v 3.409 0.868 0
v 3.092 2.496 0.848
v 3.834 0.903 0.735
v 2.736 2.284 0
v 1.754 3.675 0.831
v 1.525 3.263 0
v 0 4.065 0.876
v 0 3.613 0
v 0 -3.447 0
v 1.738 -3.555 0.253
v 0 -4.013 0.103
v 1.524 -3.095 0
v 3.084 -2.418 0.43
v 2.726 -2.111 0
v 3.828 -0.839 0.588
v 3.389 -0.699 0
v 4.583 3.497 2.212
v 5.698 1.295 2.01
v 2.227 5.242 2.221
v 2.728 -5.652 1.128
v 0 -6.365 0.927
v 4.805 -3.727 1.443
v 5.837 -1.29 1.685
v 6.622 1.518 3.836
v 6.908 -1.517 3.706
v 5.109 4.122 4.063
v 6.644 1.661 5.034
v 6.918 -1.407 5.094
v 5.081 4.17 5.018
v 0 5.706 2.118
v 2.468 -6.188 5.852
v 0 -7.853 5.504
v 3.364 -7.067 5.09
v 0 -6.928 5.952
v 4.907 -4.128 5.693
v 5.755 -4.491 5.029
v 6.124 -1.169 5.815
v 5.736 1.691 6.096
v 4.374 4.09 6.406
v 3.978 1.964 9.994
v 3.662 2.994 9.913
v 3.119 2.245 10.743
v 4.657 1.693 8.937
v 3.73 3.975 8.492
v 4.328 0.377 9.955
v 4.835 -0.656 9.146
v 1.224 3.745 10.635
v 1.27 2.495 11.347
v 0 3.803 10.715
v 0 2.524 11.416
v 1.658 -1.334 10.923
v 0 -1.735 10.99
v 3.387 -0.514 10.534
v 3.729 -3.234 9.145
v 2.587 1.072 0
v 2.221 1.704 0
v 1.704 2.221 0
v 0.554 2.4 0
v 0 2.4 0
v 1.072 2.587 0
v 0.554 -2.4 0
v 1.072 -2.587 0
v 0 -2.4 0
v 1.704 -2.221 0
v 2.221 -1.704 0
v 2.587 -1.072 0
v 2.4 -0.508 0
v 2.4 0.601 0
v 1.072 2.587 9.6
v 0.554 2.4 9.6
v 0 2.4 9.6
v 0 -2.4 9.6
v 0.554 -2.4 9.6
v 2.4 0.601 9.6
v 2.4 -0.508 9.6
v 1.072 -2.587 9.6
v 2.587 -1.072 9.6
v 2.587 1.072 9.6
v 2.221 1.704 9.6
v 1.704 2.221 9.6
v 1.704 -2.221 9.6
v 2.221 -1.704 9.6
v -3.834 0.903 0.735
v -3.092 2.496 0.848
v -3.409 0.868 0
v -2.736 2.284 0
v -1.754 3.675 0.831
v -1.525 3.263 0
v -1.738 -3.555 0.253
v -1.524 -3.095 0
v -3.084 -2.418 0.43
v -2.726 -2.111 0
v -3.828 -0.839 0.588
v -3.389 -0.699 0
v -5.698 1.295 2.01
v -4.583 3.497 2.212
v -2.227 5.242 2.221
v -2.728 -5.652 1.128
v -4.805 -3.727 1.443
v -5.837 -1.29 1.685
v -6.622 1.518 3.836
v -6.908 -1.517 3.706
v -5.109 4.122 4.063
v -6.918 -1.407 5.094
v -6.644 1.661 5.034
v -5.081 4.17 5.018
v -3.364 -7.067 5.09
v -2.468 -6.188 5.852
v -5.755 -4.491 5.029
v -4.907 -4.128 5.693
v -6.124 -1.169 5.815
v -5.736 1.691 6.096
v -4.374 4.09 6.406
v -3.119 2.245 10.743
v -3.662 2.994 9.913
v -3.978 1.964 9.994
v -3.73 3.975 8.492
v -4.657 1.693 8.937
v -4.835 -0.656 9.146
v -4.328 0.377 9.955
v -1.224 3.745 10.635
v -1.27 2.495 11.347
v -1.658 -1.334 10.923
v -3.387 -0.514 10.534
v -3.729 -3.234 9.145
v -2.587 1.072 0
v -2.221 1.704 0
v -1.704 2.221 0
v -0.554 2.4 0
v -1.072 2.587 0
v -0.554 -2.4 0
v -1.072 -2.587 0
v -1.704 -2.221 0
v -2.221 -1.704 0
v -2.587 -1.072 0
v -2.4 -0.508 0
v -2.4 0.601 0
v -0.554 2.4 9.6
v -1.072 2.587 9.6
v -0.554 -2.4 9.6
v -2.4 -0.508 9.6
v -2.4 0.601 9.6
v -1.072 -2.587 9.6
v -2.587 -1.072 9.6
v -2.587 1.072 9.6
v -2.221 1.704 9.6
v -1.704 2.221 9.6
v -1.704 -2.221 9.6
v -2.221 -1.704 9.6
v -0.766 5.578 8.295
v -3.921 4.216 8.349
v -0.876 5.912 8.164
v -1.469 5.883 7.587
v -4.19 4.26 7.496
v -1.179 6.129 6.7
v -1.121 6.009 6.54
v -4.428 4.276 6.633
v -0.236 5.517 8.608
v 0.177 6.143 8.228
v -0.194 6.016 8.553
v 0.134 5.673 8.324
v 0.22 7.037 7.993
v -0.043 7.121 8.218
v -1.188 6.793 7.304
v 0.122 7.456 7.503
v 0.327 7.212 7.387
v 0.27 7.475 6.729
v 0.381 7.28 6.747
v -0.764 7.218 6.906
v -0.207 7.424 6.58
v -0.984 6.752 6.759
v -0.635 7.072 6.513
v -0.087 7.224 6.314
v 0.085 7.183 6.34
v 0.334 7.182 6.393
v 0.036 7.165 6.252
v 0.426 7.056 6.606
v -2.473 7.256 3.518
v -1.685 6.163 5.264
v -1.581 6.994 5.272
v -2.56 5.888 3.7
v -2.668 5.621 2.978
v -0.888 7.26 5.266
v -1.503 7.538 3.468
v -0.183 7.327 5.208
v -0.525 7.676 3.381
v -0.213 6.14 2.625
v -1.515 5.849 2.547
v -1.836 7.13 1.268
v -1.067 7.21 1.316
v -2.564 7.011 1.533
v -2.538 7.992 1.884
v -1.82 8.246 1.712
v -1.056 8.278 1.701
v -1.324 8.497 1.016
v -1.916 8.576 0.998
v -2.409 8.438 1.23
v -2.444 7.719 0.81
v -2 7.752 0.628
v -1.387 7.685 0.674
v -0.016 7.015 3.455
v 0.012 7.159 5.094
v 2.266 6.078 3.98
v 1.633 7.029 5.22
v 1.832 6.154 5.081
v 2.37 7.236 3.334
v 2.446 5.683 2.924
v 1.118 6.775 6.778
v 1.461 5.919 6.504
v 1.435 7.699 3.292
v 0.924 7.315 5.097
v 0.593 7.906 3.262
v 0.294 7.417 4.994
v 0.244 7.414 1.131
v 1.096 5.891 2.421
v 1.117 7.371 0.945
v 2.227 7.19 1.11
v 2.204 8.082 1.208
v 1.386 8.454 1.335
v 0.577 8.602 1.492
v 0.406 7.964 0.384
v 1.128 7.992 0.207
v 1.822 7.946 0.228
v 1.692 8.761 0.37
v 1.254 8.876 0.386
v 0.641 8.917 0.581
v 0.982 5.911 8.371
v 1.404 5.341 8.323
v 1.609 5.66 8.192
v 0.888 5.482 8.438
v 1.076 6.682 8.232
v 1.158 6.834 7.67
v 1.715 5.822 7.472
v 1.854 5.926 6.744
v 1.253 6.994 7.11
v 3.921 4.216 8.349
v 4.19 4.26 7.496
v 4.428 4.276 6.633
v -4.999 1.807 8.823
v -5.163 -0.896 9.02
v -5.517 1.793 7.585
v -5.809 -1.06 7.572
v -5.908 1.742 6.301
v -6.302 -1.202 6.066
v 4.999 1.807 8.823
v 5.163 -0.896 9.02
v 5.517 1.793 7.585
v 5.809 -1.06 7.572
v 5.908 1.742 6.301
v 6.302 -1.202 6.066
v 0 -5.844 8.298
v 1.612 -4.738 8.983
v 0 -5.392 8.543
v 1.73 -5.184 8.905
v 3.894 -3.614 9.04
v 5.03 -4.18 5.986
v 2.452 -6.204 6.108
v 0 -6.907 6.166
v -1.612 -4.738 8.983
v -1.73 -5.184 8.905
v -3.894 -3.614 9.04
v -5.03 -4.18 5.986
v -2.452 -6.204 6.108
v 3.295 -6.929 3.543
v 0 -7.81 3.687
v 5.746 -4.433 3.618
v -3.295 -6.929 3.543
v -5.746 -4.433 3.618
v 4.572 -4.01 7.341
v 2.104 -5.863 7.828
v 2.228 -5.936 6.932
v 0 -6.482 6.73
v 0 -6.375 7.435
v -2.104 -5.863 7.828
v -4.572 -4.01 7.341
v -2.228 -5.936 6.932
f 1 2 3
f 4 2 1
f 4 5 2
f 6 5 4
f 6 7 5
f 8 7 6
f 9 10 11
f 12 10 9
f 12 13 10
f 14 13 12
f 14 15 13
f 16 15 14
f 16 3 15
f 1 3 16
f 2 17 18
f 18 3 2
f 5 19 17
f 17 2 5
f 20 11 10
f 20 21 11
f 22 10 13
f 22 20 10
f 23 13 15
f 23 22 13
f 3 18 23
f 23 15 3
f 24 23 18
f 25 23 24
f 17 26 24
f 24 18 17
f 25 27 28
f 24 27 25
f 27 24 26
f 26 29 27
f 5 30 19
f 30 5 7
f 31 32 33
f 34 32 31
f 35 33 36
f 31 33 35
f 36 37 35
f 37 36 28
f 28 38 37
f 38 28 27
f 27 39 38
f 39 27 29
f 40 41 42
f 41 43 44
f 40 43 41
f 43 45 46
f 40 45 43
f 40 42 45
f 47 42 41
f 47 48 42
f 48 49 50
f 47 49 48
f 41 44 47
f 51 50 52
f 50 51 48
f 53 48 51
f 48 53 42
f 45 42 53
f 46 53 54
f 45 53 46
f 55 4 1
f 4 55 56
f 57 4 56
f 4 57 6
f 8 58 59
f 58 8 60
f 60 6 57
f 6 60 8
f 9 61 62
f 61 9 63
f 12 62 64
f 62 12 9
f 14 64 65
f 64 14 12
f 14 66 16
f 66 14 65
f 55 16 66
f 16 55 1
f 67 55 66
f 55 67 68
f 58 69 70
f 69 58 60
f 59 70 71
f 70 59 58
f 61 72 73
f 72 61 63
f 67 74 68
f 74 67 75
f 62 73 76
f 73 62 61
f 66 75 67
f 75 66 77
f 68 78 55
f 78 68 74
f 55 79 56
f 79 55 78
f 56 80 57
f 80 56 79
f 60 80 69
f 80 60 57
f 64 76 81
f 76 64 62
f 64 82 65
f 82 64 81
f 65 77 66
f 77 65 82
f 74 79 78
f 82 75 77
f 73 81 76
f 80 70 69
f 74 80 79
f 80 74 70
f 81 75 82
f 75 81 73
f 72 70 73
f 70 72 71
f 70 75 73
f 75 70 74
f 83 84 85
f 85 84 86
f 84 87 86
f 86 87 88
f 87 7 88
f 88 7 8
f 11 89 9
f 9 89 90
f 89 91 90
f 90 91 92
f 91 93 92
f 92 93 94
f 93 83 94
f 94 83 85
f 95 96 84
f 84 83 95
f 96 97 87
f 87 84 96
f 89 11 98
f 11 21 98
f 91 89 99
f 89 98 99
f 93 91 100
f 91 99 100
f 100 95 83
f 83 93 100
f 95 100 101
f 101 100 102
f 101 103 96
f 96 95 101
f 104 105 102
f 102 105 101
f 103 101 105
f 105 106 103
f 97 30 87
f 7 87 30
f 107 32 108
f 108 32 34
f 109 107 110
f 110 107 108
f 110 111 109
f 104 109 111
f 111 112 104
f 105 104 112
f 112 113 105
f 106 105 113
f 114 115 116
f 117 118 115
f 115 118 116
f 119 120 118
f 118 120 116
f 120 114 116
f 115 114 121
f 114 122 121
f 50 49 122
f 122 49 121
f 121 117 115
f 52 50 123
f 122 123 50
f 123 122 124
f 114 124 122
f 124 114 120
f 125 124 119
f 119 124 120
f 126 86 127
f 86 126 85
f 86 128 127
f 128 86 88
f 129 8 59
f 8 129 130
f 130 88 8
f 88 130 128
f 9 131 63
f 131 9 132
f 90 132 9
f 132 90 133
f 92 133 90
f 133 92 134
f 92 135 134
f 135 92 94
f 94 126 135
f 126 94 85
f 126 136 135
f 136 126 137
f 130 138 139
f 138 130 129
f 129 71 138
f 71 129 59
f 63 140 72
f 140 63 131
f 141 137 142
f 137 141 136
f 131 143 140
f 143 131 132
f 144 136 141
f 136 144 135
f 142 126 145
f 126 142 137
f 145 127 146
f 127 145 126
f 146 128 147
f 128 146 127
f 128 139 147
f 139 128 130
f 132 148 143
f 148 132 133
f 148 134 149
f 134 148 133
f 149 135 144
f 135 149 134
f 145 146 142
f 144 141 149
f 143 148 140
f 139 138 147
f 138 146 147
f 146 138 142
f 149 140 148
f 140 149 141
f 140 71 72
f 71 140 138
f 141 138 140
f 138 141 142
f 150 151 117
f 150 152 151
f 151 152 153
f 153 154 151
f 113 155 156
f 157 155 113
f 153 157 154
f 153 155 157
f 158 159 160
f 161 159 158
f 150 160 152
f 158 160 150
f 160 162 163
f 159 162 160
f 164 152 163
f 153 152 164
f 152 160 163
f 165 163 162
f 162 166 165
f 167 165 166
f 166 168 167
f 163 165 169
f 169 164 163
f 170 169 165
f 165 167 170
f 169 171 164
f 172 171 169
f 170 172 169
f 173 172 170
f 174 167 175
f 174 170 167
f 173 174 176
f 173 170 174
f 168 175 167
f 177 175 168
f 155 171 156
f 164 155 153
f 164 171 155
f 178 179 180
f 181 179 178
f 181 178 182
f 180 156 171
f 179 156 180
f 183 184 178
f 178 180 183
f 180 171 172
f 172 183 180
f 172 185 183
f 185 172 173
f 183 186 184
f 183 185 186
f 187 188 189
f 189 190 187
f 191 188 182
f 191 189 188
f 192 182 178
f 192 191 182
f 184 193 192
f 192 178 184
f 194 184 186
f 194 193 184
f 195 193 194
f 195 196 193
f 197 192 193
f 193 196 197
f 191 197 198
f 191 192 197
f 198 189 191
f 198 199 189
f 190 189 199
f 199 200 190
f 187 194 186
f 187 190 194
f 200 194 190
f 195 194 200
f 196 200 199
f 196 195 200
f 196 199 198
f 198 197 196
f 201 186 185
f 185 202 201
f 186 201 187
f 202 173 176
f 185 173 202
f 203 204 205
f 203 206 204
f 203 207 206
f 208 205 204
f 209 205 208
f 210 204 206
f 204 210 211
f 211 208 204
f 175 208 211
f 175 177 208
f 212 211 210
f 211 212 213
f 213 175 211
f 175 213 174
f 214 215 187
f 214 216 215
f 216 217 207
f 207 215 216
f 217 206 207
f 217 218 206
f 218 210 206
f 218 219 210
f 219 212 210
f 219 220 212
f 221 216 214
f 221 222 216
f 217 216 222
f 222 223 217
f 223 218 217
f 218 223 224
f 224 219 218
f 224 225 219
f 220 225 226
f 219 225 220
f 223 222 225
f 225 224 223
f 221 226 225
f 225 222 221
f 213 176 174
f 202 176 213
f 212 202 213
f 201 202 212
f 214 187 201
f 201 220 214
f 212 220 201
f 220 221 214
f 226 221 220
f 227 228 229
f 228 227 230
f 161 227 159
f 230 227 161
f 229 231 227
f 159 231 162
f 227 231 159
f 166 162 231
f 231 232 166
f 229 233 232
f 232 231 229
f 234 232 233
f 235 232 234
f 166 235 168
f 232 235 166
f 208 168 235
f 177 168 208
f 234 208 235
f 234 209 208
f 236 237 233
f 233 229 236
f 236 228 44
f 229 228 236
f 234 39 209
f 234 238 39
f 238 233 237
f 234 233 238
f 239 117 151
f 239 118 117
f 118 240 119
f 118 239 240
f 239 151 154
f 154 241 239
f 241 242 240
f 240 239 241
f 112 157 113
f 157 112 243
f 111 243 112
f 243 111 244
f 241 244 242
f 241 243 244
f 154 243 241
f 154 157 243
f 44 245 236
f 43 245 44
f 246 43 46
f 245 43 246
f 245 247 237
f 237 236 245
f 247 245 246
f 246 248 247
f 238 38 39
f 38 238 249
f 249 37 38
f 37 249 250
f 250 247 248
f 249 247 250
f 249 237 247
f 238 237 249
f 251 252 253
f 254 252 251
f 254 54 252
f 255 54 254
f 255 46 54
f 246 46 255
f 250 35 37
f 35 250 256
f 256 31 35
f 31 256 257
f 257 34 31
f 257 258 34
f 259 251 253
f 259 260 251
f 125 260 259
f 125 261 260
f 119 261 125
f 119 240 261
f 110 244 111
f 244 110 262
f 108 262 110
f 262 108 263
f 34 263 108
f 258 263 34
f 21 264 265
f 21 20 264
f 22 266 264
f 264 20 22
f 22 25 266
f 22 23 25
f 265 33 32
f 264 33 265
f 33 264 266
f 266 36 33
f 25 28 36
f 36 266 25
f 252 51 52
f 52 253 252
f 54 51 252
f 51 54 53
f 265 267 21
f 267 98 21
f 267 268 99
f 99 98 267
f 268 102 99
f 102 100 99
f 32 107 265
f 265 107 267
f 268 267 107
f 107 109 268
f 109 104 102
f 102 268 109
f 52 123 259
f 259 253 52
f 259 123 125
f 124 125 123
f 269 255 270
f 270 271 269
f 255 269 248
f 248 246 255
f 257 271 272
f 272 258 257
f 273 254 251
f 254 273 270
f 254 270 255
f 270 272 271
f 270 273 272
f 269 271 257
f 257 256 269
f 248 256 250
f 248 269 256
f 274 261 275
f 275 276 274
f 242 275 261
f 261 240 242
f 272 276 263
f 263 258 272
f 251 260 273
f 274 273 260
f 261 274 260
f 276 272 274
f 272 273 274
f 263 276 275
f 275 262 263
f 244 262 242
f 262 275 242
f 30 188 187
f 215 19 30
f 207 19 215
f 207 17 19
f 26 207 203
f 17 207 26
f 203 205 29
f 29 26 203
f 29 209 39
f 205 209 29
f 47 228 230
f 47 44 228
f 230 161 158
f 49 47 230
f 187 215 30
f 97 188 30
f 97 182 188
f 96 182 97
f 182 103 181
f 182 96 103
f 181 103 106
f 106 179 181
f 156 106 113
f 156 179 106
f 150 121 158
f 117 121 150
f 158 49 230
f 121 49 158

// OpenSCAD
use <../lib.scad>
use <s/12607s01.scad>
use <s/12607s02.scad>
use <s/12607s03.scad>
use <s/12607s04.scad>
use <s/12607s05.scad>
function ldraw_lib__12607() = [
// 0 Minifig Head Ninja Turtle
// 0 Name: 12607.dat
// 0 Author: Chris Böhnke [KnightOfTarenta]
// 0 !LDRAW_ORG Part UPDATE 2025-02
// 0 !LICENSE Licensed under CC BY 4.0 : see CAreadme.txt
// 
// 0 BFC CERTIFY CCW
  [0,"BFC","CERTIFY"],
  [0,"BFC","CCW"],
// 
// 0 !HISTORY 2013-08-14 {LEGO Digital Designer} Original part shape
// 0 !HISTORY 2024-04-14 [KnightOfTarenta] File preparation for LDraw Parts Tracker
// 0 !HISTORY 2025-02-27 [OrionP] Official Update 2025-02
// 
// 1 16 0 0 0 1 0 0 0 1 0 0 0 1 s\12607s01.dat
  [1,16,0,0,0,1,0,0,0,1,0,0,0,1, ldraw_lib__s__12607s01()],
// 1 16 0 0 0 -1 0 0 0 1 0 0 0 1 s\12607s01.dat
  [1,16,0,0,0,-1,0,0,0,1,0,0,0,1, ldraw_lib__s__12607s01()],
// 1 16 0 0 0 1 0 0 0 1 0 0 0 1 s\12607s02.dat
  [1,16,0,0,0,1,0,0,0,1,0,0,0,1, ldraw_lib__s__12607s02()],
// 1 16 0 0 0 1 0 0 0 1 0 0 0 1 s\12607s03.dat
  [1,16,0,0,0,1,0,0,0,1,0,0,0,1, ldraw_lib__s__12607s03()],
// 1 16 0 0 0 -1 0 0 0 1 0 0 0 1 s\12607s03.dat
  [1,16,0,0,0,-1,0,0,0,1,0,0,0,1, ldraw_lib__s__12607s03()],
// 1 16 0 0 0 1 0 0 0 1 0 0 0 1 s\12607s04.dat
  [1,16,0,0,0,1,0,0,0,1,0,0,0,1, ldraw_lib__s__12607s04()],
// 1 16 0 0 0 -1 0 0 0 1 0 0 0 1 s\12607s04.dat
  [1,16,0,0,0,-1,0,0,0,1,0,0,0,1, ldraw_lib__s__12607s04()],
// 1 16 0 0 0 1 0 0 0 1 0 0 0 1 s\12607s05.dat
  [1,16,0,0,0,1,0,0,0,1,0,0,0,1, ldraw_lib__s__12607s05()],
];
module ldraw_lib__12607(step=0, col=false, unit=2/5, alt=false, line=0.2, solid=!$preview)
    makepoly(ldraw_lib__12607(), step=step, col=col, unit=unit, alt=alt, line=line, solid=solid);
ldraw_lib__12607(line=0.2);
